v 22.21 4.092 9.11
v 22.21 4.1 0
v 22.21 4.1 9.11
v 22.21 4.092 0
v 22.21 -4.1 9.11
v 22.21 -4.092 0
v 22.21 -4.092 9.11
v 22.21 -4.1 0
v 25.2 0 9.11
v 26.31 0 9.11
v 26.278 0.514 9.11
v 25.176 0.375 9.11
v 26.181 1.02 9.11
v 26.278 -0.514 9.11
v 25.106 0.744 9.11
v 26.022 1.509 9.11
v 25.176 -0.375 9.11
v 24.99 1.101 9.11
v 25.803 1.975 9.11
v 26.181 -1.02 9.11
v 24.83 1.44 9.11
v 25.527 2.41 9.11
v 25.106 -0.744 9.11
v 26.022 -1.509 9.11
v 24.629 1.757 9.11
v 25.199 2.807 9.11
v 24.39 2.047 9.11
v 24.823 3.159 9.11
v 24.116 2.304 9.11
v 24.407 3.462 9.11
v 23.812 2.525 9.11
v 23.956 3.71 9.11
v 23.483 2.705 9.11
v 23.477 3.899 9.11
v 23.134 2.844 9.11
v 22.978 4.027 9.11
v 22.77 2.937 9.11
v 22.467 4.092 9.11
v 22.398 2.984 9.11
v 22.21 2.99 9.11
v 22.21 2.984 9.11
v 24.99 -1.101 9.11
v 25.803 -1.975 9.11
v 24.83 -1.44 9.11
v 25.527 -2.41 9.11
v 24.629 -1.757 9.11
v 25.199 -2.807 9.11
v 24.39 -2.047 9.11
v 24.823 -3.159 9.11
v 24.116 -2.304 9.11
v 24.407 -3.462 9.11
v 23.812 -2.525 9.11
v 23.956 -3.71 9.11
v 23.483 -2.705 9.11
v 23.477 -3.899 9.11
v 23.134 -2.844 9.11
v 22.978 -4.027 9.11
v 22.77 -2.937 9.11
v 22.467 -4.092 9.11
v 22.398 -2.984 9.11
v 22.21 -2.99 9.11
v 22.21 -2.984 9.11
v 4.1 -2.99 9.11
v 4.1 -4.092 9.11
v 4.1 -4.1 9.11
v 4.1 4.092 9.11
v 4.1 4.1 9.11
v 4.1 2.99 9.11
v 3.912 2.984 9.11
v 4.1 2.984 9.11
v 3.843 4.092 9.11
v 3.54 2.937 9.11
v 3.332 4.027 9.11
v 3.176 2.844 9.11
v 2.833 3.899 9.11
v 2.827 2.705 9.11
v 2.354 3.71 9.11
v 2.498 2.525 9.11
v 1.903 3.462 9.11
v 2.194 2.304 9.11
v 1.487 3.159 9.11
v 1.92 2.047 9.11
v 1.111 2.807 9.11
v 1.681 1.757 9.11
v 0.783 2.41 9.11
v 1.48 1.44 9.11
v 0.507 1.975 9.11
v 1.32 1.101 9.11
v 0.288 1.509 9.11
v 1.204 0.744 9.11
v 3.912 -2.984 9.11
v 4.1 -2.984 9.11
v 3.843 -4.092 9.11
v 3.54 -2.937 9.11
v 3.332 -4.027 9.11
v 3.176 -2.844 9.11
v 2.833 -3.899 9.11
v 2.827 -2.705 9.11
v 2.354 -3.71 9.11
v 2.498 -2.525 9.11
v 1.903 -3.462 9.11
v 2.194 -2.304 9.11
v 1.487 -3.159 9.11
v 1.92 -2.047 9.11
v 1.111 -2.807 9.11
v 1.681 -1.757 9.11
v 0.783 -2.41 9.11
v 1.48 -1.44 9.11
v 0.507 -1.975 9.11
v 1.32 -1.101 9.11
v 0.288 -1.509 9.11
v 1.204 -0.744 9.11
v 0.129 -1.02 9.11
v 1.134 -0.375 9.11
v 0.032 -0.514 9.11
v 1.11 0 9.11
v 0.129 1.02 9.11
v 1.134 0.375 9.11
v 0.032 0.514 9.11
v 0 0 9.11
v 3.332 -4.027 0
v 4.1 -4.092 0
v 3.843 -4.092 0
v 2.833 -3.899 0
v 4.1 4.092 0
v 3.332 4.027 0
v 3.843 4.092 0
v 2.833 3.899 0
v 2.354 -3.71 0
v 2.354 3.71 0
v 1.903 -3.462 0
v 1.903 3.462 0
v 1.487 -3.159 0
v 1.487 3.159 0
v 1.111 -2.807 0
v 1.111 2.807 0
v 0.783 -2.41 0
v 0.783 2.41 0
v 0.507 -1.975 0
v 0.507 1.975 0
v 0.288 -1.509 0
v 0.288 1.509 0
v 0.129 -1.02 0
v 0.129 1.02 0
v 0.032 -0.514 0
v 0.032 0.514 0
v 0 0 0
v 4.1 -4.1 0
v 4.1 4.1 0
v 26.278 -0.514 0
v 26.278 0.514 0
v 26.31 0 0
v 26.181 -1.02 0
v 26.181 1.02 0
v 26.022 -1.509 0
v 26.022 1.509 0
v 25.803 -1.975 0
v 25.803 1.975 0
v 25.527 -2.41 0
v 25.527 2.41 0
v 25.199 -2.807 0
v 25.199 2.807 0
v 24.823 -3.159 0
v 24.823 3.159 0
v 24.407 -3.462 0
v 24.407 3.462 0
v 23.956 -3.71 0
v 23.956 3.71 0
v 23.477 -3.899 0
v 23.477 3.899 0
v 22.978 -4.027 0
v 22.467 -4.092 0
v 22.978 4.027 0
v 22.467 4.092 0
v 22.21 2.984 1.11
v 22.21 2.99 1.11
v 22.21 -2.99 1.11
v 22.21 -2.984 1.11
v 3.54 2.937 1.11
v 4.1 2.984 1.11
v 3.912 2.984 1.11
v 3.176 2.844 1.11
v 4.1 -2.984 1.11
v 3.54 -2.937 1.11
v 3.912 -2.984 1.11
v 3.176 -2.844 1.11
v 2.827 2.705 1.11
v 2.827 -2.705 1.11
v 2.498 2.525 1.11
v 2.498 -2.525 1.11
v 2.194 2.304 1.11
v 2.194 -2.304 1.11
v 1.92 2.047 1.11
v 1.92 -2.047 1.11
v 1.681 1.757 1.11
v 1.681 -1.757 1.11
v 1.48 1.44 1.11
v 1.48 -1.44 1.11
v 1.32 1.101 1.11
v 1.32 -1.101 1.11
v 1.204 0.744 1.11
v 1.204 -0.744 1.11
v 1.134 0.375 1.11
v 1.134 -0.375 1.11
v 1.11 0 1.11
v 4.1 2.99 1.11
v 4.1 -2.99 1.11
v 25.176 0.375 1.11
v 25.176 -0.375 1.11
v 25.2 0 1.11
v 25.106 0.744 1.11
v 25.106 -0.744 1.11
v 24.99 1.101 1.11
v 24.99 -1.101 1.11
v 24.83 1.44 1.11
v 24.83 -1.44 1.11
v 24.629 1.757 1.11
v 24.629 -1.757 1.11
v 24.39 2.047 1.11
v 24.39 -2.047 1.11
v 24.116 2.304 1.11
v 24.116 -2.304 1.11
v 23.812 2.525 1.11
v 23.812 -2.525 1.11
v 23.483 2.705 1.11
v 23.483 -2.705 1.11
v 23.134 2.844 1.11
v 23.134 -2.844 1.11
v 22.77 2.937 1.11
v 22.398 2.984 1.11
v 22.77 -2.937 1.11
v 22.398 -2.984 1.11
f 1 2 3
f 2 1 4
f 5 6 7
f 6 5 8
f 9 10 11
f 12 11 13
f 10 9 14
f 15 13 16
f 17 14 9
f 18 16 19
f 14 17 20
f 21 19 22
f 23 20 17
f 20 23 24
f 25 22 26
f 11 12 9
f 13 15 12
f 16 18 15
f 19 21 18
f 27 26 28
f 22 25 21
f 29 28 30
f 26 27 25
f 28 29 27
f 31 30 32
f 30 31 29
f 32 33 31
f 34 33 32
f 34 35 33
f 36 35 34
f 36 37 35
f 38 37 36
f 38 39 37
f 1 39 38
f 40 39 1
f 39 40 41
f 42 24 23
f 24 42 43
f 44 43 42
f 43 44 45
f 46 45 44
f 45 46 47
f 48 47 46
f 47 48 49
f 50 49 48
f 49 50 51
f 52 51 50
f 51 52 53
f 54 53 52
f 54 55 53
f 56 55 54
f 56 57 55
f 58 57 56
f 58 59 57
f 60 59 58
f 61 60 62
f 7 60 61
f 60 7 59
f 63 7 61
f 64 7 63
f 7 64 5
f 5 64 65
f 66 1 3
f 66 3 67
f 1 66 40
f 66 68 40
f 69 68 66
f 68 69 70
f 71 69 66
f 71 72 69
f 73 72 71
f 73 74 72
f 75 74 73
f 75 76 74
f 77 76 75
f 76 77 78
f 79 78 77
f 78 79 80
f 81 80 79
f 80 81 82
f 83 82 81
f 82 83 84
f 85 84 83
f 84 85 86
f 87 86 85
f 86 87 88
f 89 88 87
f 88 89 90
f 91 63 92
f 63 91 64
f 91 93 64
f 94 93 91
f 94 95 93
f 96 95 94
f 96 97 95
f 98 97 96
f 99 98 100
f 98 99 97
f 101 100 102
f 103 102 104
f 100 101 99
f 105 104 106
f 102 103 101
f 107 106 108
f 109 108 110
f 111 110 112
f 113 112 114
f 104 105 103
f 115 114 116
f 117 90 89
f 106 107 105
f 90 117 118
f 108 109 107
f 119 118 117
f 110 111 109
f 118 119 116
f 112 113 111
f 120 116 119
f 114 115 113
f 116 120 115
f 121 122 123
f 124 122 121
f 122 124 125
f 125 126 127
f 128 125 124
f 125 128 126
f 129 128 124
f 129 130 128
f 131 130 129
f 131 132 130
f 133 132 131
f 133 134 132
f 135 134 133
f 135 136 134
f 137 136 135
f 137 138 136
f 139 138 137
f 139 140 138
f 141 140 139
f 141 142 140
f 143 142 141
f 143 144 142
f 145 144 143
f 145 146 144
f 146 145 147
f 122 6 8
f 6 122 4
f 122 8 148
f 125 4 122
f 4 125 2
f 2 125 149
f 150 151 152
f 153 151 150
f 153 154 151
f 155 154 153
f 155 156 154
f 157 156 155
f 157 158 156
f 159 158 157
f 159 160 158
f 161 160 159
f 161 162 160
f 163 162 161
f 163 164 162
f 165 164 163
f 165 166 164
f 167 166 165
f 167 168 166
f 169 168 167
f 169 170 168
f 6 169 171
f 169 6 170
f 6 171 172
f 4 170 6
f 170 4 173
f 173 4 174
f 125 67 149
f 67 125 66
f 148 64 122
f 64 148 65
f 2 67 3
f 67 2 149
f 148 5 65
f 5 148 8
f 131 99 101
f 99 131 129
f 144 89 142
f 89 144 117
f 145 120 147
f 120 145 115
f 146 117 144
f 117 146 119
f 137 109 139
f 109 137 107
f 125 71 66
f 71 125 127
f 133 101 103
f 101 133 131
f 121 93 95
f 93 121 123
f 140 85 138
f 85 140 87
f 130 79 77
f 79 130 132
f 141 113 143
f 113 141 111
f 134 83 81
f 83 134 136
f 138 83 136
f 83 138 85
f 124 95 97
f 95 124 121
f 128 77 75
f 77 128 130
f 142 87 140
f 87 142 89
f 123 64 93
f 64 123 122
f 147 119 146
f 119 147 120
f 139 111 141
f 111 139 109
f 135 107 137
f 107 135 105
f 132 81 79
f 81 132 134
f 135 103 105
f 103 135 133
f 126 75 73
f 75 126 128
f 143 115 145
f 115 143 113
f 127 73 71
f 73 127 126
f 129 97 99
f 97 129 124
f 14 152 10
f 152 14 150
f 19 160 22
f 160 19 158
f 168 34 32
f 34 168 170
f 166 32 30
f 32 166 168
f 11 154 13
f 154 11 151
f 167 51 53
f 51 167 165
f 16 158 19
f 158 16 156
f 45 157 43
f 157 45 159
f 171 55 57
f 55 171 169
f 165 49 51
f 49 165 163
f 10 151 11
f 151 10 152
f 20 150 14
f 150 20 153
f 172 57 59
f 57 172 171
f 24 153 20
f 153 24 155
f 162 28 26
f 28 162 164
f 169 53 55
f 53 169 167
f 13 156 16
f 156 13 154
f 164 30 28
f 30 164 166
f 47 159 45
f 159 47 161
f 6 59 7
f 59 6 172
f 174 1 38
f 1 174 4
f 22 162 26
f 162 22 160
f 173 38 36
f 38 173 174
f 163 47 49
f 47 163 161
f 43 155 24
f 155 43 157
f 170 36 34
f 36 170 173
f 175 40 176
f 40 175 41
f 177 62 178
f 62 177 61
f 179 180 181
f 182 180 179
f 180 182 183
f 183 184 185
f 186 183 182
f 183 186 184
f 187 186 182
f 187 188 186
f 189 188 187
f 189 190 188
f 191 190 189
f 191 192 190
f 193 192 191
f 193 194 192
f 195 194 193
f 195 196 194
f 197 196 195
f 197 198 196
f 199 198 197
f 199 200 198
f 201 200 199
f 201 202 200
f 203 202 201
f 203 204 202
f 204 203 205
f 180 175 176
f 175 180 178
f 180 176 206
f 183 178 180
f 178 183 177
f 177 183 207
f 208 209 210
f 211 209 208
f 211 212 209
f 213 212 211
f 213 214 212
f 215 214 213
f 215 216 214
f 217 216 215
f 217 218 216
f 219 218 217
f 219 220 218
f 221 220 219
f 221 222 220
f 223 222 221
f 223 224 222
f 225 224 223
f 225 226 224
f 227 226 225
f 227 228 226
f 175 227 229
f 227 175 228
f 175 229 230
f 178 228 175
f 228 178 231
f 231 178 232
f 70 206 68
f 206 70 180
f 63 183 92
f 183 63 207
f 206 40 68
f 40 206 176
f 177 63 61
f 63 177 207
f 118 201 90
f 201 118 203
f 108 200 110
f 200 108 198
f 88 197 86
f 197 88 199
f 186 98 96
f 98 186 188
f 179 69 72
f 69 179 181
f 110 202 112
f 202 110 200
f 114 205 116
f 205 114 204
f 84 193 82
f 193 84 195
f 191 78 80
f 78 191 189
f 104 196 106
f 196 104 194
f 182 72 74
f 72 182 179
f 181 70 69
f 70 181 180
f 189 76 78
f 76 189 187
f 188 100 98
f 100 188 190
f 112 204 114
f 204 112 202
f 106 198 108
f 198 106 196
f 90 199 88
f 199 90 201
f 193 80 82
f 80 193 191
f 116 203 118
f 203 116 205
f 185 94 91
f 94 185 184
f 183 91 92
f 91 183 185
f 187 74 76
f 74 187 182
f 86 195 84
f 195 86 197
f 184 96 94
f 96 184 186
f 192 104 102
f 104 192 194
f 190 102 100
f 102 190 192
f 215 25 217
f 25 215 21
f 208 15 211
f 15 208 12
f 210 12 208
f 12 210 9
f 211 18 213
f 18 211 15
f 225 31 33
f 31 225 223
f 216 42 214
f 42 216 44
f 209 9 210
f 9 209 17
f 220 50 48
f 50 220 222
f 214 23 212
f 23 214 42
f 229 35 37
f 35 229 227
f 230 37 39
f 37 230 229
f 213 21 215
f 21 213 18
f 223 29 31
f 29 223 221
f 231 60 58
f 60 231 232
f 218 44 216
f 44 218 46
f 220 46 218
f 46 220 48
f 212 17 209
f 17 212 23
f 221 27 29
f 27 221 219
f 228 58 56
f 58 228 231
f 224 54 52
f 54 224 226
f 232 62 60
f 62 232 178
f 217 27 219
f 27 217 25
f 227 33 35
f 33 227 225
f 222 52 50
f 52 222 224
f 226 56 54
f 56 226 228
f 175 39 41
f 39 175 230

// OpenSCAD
r = 4.1;
w = 25.2;
s = 1.11;
h = 9.11;

difference() {
    union()
    { 
        translate([r, -r,0]) cube([w-2*r+s, 2*r, h]);
        translate([r,0,0]) kraj(r);
        translate([w-r+s,0,0]) kraj(r);
    }
    
    union()
    {   
        translate([0,0,s]) {
    
            translate([r, -r+s,0]) cube([w-2*r+s, (2*r)-2*s, h]);
            translate([r,0,0]) kraj(r-s);  
            translate([w-r+s,0,0]) kraj(r-s);
        }
    }
    
}

module kraj(r = 4) {
    
    cylinder(h, r, r, $fn=50);
}
